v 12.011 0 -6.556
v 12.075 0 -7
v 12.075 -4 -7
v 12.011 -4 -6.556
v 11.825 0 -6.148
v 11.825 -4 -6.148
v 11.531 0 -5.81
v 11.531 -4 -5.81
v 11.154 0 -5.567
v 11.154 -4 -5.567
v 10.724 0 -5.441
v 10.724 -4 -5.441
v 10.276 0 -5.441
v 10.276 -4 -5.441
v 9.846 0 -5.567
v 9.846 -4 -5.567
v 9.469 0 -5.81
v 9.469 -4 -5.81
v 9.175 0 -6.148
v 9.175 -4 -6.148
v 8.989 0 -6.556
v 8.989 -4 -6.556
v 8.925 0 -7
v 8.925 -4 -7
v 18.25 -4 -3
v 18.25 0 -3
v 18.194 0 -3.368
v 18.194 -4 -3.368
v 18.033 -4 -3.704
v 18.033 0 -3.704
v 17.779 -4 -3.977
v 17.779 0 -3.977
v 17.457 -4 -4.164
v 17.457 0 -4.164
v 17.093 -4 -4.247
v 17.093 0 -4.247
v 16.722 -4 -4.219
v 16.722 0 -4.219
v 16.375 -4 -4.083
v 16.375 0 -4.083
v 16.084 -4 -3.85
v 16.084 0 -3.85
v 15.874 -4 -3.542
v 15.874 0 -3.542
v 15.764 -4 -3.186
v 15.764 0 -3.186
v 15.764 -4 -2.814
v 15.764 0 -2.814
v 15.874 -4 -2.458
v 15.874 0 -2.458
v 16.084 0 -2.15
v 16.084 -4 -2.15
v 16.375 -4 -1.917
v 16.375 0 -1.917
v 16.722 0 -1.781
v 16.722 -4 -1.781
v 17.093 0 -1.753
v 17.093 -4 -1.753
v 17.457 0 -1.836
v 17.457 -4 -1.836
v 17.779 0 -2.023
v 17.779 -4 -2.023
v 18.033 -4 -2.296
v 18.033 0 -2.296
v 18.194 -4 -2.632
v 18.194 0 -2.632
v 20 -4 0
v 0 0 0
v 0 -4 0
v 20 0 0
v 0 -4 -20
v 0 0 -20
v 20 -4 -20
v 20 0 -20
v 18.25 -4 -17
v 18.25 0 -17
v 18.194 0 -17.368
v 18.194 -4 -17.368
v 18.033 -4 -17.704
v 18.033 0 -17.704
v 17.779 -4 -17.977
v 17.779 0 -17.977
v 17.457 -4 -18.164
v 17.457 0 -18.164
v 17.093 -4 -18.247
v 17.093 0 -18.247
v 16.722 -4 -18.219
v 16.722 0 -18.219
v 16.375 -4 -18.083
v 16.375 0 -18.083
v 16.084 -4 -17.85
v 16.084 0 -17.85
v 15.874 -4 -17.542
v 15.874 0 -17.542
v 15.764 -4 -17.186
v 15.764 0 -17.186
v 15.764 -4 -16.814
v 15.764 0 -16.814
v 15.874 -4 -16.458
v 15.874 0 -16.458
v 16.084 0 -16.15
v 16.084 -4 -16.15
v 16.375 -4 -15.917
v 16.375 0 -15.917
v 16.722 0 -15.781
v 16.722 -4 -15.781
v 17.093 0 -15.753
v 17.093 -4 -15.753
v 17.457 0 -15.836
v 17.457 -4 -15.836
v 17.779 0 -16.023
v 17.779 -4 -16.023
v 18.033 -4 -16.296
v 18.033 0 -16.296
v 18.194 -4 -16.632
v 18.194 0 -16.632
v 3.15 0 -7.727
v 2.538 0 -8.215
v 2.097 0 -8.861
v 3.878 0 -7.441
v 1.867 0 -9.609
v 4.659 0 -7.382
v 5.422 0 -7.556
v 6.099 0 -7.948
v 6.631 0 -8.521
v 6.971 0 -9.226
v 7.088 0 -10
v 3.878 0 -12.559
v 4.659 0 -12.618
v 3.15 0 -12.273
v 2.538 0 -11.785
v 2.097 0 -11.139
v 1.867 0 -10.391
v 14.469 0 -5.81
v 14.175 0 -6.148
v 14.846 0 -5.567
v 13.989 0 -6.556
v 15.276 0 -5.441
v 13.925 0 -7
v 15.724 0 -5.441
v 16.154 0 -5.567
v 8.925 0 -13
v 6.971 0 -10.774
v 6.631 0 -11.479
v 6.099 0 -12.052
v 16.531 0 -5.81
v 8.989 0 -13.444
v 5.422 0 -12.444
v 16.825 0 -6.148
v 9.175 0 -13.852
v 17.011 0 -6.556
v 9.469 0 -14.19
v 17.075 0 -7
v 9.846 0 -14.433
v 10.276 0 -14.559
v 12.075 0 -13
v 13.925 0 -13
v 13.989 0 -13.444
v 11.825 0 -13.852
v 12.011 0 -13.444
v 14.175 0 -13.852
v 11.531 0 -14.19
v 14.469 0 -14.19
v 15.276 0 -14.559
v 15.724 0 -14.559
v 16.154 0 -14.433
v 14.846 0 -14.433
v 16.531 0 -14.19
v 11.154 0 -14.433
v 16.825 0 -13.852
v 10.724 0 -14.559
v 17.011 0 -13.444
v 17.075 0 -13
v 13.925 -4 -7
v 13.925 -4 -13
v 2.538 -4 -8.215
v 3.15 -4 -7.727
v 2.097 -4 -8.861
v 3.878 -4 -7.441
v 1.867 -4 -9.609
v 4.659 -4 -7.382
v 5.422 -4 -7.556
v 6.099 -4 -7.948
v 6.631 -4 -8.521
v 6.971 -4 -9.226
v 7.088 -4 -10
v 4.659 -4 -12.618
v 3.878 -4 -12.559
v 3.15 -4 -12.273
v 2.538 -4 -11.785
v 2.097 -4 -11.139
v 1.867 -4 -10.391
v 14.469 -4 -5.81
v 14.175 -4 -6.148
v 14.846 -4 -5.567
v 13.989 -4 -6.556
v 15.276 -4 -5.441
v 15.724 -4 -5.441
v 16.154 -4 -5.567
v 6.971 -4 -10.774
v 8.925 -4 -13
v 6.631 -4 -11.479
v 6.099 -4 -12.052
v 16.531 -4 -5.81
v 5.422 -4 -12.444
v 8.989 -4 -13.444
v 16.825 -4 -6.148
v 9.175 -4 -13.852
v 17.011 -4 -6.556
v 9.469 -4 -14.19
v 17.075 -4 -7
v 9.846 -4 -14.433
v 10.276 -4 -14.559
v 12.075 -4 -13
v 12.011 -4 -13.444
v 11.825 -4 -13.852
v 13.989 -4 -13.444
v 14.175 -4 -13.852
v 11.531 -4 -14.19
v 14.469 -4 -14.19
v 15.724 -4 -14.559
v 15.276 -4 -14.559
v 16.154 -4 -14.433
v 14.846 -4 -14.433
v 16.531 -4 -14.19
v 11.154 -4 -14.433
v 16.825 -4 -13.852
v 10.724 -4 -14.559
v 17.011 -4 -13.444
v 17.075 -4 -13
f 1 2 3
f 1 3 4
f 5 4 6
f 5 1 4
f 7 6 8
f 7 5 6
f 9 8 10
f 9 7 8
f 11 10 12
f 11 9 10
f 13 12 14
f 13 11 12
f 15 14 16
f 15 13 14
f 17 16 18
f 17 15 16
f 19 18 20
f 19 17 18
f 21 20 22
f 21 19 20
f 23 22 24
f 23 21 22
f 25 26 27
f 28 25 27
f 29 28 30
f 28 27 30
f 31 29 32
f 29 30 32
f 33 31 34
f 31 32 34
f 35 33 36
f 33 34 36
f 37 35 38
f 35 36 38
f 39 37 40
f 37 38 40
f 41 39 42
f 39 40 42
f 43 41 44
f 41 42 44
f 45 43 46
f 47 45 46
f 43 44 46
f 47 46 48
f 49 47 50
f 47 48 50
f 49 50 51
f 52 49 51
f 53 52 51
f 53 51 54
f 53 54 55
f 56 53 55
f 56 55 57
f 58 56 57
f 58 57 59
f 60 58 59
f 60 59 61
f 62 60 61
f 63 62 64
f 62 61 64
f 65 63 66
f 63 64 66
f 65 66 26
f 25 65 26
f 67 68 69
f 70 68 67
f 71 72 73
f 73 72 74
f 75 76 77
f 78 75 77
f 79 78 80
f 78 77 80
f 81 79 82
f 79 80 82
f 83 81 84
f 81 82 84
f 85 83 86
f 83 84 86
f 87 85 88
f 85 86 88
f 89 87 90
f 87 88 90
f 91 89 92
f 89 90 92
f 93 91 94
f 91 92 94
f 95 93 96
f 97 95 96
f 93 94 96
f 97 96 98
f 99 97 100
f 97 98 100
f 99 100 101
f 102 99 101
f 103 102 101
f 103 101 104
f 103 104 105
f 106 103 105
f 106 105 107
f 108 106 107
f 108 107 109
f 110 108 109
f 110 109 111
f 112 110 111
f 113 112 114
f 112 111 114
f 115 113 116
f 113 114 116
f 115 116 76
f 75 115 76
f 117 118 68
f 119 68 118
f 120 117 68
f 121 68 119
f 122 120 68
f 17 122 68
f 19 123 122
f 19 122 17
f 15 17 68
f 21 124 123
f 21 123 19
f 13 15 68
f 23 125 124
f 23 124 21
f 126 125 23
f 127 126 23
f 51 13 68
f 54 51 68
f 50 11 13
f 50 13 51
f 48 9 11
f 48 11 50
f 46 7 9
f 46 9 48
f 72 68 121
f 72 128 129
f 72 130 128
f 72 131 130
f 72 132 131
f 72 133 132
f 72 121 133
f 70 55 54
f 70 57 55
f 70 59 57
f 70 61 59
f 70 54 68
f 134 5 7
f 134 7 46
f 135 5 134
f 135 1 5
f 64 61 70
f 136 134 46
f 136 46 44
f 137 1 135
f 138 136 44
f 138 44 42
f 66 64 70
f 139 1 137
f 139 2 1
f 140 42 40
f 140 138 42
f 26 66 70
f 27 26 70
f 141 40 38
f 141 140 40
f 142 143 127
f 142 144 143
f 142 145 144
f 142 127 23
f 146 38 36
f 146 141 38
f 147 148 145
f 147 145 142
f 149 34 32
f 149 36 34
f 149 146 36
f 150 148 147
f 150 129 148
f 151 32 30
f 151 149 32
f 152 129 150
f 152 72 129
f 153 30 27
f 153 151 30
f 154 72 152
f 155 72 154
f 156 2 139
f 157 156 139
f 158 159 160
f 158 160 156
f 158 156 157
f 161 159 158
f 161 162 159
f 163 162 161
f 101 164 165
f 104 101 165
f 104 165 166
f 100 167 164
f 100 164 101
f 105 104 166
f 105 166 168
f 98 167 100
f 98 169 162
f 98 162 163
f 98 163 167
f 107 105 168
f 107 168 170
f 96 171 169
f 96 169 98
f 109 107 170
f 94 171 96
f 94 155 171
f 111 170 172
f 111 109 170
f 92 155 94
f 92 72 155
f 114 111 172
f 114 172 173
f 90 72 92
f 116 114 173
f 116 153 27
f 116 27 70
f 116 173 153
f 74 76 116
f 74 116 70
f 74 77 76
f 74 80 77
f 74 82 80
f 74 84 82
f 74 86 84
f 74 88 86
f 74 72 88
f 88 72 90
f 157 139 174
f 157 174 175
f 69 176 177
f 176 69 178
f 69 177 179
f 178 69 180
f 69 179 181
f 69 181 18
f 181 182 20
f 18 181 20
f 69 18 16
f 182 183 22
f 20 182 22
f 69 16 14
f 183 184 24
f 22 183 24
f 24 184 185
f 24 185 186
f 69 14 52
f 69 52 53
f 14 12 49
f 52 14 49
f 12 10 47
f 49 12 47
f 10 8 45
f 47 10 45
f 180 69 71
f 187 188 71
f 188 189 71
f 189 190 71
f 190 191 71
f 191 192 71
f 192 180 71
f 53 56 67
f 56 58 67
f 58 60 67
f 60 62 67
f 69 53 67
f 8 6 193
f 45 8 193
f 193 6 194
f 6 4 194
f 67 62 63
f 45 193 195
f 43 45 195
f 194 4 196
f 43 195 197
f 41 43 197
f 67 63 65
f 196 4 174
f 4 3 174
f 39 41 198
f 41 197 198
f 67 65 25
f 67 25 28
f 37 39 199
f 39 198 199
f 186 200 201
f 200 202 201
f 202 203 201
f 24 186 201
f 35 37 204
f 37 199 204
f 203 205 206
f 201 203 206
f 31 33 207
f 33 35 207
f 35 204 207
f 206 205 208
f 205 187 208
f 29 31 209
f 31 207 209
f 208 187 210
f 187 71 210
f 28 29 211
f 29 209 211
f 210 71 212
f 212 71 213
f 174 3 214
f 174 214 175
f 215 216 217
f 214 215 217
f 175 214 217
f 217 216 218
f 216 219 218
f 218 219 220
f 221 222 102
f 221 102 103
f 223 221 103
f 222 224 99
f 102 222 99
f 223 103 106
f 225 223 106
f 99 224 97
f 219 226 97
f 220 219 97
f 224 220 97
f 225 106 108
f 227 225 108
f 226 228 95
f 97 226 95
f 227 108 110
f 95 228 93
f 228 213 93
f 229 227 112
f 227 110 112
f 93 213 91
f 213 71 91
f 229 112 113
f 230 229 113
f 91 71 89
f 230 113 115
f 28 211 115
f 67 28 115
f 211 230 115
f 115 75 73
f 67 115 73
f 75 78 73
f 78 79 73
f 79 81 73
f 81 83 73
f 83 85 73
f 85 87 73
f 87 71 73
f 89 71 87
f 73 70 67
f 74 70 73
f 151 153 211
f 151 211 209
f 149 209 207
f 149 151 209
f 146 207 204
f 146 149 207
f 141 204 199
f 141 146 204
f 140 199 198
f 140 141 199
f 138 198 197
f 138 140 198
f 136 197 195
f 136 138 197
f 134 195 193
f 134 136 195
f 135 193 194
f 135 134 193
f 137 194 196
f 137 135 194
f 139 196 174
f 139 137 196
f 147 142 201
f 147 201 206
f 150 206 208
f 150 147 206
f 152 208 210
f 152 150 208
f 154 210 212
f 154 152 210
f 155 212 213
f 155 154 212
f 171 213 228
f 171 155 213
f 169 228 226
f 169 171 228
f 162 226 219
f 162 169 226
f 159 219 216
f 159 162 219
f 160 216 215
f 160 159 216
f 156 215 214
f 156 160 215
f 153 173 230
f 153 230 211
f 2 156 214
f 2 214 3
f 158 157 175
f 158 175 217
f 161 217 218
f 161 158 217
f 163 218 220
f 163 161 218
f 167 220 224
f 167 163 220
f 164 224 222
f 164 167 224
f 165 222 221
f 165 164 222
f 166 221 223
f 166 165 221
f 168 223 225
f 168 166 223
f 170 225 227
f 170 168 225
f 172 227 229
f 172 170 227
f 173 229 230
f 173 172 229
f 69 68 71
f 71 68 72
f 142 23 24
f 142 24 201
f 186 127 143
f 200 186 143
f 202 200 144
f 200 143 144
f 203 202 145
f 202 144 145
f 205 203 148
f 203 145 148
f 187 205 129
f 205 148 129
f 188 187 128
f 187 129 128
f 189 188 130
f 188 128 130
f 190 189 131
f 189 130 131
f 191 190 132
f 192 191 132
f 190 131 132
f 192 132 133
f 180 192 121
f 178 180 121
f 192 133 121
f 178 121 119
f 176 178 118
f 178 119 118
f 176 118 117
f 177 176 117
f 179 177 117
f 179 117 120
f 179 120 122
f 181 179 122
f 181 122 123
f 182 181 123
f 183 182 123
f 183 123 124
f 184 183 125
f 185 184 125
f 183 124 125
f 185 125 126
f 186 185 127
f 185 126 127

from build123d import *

# Parameters (mm, degrees)
SKETCH1_W           = 20
SKETCH1_H           = 20
SKETCH1_R           = 1.25
SKETCH1_R_2         = 2.625
BOSS_EXTRUDE1_DEPTH = 4


with BuildPart() as part:
    # Sketch1 → Boss-Extrude1 (new body)
    with BuildSketch(Plane(origin=(0, 0, 0), x_dir=(1, 0, 0), z_dir=(0, 1, 0))):
        with Locations((10, 10)):
            Rectangle(SKETCH1_W, SKETCH1_H)
        with Locations((17, 17)):
            Circle(SKETCH1_R, mode=Mode.SUBTRACT)
        with Locations((4.4625, 10)):
            Circle(SKETCH1_R_2, mode=Mode.SUBTRACT)
        with Locations((17, 3)):
            Circle(SKETCH1_R, mode=Mode.SUBTRACT)
        with BuildLine():
            Line((13.925, 7), (13.925, 13))
            ThreePointArc((13.925, 13), (15.5, 14.575), (17.075, 13))
            Line((17.075, 13), (17.075, 7))
            ThreePointArc((17.075, 7), (15.5, 5.425), (13.925, 7))
        make_face(mode=Mode.SUBTRACT)
        with BuildLine():
            Line((8.925, 7), (8.925, 13))
            ThreePointArc((8.925, 13), (10.5, 14.575), (12.075, 13))
            Line((12.075, 13), (12.075, 7))
            ThreePointArc((12.075, 7), (10.5, 5.425), (8.925, 7))
        make_face(mode=Mode.SUBTRACT)
    extrude(amount=-BOSS_EXTRUDE1_DEPTH)


solid = part.part
